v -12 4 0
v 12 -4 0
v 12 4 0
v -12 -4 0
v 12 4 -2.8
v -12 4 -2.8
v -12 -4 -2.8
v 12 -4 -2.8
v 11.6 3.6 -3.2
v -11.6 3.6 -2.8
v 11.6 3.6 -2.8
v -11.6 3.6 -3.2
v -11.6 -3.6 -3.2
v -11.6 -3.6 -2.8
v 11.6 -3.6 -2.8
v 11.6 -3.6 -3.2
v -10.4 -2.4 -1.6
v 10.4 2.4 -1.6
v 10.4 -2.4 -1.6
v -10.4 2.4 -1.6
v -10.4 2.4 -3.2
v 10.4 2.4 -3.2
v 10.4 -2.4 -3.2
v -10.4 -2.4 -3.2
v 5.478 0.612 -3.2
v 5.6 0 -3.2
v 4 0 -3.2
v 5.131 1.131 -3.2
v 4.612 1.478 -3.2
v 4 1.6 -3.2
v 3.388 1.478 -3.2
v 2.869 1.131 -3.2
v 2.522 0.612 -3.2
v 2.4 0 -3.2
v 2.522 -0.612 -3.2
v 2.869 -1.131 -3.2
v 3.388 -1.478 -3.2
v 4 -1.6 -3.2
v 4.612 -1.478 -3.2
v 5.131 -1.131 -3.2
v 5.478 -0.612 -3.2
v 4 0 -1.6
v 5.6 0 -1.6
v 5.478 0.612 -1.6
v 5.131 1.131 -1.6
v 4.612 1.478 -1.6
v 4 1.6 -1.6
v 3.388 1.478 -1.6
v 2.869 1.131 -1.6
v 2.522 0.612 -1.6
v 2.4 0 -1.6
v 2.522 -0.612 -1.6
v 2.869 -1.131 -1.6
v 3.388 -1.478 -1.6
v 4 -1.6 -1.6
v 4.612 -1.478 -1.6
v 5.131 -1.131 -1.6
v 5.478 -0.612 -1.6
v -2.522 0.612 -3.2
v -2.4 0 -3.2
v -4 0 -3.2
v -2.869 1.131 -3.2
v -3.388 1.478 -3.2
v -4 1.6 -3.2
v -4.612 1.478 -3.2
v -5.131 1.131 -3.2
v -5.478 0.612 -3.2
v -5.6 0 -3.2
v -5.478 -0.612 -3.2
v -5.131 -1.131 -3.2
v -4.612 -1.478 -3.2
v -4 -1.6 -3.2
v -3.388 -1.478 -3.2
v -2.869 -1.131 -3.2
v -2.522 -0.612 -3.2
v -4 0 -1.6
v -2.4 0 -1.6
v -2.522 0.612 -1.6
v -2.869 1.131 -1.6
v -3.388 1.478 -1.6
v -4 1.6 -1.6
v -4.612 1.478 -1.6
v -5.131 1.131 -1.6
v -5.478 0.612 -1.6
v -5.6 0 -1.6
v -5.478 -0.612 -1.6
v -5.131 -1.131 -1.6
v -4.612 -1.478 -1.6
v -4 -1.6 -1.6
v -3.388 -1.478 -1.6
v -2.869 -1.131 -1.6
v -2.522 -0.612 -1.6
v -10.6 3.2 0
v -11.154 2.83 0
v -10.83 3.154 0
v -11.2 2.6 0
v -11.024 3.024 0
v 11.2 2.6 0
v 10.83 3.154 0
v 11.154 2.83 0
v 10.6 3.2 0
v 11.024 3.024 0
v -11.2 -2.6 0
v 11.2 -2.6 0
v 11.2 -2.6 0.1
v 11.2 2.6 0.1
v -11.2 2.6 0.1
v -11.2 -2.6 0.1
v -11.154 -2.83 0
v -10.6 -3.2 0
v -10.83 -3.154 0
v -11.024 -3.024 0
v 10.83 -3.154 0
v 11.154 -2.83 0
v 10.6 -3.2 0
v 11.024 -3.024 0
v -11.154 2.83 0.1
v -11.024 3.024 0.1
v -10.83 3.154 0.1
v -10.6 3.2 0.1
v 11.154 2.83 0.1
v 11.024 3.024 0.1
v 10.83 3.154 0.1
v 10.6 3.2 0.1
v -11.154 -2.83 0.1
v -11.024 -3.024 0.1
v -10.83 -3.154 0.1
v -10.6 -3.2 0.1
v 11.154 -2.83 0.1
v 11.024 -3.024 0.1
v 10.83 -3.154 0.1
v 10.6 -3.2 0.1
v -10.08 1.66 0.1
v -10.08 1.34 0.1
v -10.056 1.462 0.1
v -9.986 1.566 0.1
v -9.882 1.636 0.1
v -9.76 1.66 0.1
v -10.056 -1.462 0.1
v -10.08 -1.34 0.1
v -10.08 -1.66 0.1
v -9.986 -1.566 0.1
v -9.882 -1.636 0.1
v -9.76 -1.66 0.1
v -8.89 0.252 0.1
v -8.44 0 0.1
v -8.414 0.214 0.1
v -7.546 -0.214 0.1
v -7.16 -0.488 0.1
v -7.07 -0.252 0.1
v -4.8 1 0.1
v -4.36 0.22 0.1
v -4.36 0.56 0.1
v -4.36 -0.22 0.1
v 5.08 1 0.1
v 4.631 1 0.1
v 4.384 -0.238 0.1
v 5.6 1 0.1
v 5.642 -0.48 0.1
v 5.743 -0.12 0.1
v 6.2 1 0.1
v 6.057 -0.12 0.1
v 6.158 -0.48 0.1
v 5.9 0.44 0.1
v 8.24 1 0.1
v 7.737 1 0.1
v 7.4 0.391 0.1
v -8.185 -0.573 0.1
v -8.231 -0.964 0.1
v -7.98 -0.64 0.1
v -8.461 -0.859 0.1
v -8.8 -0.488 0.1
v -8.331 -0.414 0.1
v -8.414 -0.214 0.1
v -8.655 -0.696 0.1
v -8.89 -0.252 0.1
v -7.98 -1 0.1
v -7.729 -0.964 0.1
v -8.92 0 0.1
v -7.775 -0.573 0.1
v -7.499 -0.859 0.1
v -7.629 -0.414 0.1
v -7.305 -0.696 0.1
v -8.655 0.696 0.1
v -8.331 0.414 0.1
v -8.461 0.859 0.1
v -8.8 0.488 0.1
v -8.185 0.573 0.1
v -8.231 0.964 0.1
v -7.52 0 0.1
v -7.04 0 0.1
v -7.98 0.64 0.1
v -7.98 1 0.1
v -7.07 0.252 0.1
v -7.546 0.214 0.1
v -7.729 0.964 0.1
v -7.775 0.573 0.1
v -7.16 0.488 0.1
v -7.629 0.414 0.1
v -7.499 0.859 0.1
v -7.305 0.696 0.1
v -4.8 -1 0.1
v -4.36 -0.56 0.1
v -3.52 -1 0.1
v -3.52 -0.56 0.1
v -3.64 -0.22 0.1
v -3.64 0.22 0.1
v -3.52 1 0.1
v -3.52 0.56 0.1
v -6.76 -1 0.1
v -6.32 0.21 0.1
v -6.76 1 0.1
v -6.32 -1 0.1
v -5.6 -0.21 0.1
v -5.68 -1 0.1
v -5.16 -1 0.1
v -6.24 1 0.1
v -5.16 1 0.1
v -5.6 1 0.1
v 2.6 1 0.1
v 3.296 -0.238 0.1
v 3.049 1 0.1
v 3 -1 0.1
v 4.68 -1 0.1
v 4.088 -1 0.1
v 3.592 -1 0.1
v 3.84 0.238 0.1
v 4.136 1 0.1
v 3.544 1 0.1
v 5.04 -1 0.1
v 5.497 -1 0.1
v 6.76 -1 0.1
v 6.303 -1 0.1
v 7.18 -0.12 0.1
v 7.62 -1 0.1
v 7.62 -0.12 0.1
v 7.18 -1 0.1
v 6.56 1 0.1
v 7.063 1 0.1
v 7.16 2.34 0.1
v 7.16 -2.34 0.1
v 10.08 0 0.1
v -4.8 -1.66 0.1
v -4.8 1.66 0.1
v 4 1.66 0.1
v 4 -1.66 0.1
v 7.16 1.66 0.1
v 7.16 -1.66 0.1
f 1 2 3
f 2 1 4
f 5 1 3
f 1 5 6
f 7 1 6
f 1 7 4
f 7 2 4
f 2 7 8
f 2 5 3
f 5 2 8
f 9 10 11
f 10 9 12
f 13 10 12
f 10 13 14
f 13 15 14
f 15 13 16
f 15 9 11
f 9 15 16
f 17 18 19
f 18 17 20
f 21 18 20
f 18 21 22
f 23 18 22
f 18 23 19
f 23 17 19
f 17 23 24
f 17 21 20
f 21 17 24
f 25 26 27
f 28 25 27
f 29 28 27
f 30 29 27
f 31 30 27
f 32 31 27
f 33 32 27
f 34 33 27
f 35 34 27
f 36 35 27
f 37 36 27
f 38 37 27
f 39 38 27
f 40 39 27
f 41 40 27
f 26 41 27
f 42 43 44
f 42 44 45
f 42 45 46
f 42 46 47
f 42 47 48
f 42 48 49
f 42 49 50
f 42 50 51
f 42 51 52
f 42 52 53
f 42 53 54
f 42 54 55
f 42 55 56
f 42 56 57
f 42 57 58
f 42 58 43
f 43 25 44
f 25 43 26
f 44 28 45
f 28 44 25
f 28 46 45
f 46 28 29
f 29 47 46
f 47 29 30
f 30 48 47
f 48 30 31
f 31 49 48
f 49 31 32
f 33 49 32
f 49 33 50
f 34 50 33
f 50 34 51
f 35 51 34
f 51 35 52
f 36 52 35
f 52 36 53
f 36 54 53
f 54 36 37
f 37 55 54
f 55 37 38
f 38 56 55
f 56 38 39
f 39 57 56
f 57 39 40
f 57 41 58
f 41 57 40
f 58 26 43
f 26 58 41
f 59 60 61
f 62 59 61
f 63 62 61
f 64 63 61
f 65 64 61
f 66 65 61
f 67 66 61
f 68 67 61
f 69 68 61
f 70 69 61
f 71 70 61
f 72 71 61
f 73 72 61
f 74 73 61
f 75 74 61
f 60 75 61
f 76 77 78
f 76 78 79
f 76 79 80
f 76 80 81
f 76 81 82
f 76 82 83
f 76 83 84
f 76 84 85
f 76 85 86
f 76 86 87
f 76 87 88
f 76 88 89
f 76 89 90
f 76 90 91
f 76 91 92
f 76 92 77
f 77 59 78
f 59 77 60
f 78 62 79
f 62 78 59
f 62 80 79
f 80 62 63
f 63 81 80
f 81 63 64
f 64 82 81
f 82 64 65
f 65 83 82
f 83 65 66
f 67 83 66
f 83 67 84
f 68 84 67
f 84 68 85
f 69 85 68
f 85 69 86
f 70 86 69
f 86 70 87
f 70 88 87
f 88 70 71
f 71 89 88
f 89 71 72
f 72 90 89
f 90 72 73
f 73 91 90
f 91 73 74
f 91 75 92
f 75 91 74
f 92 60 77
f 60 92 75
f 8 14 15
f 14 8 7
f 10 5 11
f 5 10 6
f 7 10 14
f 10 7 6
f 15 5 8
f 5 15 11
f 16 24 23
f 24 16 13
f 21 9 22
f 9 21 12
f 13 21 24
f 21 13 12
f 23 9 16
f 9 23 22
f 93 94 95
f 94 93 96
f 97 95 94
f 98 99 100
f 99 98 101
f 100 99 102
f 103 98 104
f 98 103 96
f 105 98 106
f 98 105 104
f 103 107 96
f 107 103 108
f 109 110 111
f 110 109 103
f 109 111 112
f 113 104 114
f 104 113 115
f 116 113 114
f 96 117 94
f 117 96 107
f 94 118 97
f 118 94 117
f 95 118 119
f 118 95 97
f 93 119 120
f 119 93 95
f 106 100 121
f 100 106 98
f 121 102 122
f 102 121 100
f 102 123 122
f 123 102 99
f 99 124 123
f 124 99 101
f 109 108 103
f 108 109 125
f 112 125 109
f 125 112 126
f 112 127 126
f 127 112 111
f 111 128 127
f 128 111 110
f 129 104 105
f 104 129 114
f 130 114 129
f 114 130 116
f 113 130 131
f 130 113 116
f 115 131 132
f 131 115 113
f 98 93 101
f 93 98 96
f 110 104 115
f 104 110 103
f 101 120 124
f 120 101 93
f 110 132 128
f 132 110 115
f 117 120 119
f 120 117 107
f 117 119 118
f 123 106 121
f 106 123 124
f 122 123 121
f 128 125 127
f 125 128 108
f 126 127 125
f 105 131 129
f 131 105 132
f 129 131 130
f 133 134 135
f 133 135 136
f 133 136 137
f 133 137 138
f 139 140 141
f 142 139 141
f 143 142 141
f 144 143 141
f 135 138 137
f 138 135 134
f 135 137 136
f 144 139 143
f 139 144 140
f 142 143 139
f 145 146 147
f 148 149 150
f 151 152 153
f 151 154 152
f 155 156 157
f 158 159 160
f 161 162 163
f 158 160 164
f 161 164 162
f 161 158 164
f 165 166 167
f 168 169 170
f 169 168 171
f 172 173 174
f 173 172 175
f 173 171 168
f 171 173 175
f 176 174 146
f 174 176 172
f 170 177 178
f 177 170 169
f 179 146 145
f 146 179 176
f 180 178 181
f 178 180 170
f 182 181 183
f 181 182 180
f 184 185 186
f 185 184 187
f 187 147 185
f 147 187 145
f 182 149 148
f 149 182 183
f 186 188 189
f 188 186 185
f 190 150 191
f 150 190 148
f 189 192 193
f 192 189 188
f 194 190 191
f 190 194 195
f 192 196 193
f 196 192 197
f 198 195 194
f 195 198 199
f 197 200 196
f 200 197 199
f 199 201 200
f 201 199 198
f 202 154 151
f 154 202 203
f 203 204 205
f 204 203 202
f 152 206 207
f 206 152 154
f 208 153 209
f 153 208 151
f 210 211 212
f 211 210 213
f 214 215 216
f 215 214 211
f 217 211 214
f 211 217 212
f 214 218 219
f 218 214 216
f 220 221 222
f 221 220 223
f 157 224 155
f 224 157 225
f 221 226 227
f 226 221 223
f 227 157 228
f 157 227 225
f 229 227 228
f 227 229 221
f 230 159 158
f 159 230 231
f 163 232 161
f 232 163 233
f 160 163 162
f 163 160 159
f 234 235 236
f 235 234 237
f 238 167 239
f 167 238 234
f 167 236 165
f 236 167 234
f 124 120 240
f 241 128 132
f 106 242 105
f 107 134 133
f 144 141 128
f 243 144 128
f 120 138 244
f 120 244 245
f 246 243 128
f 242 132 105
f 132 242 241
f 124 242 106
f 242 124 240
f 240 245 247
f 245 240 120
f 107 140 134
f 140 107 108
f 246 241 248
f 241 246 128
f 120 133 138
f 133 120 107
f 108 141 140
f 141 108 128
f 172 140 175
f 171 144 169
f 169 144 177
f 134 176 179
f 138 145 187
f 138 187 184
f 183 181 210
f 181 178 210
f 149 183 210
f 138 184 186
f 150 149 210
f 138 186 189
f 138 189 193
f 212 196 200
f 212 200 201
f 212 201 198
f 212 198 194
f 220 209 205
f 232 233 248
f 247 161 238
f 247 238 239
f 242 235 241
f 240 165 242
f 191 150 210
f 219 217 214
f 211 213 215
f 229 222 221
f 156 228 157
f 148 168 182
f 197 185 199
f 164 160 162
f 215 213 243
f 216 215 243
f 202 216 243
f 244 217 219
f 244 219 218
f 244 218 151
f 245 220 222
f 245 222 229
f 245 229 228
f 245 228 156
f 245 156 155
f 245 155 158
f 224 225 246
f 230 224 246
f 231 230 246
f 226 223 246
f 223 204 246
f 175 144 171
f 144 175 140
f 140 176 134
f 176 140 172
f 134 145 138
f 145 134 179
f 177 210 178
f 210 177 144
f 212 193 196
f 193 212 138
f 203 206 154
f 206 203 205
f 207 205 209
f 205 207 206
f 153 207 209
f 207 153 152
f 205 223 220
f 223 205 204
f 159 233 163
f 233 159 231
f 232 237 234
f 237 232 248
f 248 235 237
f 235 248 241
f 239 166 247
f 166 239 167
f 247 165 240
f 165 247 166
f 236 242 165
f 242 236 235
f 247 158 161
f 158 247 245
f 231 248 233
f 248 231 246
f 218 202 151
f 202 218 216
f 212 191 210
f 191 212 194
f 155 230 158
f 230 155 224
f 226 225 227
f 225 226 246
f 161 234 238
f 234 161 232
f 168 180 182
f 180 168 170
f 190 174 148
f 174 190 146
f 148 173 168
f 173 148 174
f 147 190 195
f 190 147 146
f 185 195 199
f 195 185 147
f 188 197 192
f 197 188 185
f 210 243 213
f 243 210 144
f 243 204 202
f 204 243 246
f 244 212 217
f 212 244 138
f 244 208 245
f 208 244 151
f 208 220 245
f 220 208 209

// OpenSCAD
use <../lib.scad>
use <6138629y.scad>
use <63864.scad>
function ldraw_lib__63864d03() = [
// 0 Tile  1 x  3 with "ONE WAY" in White Arrow on Blue Background Sticker
// 0 Name: 63864d03.dat
// 0 Author: Vincent Messenet [Cheenzo]
// 0 !LDRAW_ORG Shortcut UPDATE 2026-02
// 0 !LICENSE Licensed under CC BY 4.0 : see CAreadme.txt
// 
// 0 BFC CERTIFY CCW
  [0,"BFC","CERTIFY"],
  [0,"BFC","CCW"],
// 
// 0 !CATEGORY Sticker Shortcut
// 
// 0 !KEYWORDS Bricklink 63864pb076, Firehouse Headquarters, Ghostbusters
// 0 !KEYWORDS set 75827
// 
// 0 !HISTORY 2026-03-06 [OrionP] Official Update 2026-02
// 
// 1 16 0 0 0 1 0 0 0 1 0 0 0 1 63864.dat
  [1,16,0,0,0,1,0,0,0,1,0,0,0,1, ldraw_lib__63864()],
// 1 16 0 0 0 1 0 0 0 1 0 0 0 1 6138629y.dat
  [1,16,0,0,0,1,0,0,0,1,0,0,0,1, ldraw_lib__6138629y()],
];
module ldraw_lib__63864d03(step=0, col=false, unit=2/5, alt=false, line=0.2, solid=!$preview)
    makepoly(ldraw_lib__63864d03(), step=step, col=col, unit=unit, alt=alt, line=line, solid=solid);
ldraw_lib__63864d03(line=0.2);
